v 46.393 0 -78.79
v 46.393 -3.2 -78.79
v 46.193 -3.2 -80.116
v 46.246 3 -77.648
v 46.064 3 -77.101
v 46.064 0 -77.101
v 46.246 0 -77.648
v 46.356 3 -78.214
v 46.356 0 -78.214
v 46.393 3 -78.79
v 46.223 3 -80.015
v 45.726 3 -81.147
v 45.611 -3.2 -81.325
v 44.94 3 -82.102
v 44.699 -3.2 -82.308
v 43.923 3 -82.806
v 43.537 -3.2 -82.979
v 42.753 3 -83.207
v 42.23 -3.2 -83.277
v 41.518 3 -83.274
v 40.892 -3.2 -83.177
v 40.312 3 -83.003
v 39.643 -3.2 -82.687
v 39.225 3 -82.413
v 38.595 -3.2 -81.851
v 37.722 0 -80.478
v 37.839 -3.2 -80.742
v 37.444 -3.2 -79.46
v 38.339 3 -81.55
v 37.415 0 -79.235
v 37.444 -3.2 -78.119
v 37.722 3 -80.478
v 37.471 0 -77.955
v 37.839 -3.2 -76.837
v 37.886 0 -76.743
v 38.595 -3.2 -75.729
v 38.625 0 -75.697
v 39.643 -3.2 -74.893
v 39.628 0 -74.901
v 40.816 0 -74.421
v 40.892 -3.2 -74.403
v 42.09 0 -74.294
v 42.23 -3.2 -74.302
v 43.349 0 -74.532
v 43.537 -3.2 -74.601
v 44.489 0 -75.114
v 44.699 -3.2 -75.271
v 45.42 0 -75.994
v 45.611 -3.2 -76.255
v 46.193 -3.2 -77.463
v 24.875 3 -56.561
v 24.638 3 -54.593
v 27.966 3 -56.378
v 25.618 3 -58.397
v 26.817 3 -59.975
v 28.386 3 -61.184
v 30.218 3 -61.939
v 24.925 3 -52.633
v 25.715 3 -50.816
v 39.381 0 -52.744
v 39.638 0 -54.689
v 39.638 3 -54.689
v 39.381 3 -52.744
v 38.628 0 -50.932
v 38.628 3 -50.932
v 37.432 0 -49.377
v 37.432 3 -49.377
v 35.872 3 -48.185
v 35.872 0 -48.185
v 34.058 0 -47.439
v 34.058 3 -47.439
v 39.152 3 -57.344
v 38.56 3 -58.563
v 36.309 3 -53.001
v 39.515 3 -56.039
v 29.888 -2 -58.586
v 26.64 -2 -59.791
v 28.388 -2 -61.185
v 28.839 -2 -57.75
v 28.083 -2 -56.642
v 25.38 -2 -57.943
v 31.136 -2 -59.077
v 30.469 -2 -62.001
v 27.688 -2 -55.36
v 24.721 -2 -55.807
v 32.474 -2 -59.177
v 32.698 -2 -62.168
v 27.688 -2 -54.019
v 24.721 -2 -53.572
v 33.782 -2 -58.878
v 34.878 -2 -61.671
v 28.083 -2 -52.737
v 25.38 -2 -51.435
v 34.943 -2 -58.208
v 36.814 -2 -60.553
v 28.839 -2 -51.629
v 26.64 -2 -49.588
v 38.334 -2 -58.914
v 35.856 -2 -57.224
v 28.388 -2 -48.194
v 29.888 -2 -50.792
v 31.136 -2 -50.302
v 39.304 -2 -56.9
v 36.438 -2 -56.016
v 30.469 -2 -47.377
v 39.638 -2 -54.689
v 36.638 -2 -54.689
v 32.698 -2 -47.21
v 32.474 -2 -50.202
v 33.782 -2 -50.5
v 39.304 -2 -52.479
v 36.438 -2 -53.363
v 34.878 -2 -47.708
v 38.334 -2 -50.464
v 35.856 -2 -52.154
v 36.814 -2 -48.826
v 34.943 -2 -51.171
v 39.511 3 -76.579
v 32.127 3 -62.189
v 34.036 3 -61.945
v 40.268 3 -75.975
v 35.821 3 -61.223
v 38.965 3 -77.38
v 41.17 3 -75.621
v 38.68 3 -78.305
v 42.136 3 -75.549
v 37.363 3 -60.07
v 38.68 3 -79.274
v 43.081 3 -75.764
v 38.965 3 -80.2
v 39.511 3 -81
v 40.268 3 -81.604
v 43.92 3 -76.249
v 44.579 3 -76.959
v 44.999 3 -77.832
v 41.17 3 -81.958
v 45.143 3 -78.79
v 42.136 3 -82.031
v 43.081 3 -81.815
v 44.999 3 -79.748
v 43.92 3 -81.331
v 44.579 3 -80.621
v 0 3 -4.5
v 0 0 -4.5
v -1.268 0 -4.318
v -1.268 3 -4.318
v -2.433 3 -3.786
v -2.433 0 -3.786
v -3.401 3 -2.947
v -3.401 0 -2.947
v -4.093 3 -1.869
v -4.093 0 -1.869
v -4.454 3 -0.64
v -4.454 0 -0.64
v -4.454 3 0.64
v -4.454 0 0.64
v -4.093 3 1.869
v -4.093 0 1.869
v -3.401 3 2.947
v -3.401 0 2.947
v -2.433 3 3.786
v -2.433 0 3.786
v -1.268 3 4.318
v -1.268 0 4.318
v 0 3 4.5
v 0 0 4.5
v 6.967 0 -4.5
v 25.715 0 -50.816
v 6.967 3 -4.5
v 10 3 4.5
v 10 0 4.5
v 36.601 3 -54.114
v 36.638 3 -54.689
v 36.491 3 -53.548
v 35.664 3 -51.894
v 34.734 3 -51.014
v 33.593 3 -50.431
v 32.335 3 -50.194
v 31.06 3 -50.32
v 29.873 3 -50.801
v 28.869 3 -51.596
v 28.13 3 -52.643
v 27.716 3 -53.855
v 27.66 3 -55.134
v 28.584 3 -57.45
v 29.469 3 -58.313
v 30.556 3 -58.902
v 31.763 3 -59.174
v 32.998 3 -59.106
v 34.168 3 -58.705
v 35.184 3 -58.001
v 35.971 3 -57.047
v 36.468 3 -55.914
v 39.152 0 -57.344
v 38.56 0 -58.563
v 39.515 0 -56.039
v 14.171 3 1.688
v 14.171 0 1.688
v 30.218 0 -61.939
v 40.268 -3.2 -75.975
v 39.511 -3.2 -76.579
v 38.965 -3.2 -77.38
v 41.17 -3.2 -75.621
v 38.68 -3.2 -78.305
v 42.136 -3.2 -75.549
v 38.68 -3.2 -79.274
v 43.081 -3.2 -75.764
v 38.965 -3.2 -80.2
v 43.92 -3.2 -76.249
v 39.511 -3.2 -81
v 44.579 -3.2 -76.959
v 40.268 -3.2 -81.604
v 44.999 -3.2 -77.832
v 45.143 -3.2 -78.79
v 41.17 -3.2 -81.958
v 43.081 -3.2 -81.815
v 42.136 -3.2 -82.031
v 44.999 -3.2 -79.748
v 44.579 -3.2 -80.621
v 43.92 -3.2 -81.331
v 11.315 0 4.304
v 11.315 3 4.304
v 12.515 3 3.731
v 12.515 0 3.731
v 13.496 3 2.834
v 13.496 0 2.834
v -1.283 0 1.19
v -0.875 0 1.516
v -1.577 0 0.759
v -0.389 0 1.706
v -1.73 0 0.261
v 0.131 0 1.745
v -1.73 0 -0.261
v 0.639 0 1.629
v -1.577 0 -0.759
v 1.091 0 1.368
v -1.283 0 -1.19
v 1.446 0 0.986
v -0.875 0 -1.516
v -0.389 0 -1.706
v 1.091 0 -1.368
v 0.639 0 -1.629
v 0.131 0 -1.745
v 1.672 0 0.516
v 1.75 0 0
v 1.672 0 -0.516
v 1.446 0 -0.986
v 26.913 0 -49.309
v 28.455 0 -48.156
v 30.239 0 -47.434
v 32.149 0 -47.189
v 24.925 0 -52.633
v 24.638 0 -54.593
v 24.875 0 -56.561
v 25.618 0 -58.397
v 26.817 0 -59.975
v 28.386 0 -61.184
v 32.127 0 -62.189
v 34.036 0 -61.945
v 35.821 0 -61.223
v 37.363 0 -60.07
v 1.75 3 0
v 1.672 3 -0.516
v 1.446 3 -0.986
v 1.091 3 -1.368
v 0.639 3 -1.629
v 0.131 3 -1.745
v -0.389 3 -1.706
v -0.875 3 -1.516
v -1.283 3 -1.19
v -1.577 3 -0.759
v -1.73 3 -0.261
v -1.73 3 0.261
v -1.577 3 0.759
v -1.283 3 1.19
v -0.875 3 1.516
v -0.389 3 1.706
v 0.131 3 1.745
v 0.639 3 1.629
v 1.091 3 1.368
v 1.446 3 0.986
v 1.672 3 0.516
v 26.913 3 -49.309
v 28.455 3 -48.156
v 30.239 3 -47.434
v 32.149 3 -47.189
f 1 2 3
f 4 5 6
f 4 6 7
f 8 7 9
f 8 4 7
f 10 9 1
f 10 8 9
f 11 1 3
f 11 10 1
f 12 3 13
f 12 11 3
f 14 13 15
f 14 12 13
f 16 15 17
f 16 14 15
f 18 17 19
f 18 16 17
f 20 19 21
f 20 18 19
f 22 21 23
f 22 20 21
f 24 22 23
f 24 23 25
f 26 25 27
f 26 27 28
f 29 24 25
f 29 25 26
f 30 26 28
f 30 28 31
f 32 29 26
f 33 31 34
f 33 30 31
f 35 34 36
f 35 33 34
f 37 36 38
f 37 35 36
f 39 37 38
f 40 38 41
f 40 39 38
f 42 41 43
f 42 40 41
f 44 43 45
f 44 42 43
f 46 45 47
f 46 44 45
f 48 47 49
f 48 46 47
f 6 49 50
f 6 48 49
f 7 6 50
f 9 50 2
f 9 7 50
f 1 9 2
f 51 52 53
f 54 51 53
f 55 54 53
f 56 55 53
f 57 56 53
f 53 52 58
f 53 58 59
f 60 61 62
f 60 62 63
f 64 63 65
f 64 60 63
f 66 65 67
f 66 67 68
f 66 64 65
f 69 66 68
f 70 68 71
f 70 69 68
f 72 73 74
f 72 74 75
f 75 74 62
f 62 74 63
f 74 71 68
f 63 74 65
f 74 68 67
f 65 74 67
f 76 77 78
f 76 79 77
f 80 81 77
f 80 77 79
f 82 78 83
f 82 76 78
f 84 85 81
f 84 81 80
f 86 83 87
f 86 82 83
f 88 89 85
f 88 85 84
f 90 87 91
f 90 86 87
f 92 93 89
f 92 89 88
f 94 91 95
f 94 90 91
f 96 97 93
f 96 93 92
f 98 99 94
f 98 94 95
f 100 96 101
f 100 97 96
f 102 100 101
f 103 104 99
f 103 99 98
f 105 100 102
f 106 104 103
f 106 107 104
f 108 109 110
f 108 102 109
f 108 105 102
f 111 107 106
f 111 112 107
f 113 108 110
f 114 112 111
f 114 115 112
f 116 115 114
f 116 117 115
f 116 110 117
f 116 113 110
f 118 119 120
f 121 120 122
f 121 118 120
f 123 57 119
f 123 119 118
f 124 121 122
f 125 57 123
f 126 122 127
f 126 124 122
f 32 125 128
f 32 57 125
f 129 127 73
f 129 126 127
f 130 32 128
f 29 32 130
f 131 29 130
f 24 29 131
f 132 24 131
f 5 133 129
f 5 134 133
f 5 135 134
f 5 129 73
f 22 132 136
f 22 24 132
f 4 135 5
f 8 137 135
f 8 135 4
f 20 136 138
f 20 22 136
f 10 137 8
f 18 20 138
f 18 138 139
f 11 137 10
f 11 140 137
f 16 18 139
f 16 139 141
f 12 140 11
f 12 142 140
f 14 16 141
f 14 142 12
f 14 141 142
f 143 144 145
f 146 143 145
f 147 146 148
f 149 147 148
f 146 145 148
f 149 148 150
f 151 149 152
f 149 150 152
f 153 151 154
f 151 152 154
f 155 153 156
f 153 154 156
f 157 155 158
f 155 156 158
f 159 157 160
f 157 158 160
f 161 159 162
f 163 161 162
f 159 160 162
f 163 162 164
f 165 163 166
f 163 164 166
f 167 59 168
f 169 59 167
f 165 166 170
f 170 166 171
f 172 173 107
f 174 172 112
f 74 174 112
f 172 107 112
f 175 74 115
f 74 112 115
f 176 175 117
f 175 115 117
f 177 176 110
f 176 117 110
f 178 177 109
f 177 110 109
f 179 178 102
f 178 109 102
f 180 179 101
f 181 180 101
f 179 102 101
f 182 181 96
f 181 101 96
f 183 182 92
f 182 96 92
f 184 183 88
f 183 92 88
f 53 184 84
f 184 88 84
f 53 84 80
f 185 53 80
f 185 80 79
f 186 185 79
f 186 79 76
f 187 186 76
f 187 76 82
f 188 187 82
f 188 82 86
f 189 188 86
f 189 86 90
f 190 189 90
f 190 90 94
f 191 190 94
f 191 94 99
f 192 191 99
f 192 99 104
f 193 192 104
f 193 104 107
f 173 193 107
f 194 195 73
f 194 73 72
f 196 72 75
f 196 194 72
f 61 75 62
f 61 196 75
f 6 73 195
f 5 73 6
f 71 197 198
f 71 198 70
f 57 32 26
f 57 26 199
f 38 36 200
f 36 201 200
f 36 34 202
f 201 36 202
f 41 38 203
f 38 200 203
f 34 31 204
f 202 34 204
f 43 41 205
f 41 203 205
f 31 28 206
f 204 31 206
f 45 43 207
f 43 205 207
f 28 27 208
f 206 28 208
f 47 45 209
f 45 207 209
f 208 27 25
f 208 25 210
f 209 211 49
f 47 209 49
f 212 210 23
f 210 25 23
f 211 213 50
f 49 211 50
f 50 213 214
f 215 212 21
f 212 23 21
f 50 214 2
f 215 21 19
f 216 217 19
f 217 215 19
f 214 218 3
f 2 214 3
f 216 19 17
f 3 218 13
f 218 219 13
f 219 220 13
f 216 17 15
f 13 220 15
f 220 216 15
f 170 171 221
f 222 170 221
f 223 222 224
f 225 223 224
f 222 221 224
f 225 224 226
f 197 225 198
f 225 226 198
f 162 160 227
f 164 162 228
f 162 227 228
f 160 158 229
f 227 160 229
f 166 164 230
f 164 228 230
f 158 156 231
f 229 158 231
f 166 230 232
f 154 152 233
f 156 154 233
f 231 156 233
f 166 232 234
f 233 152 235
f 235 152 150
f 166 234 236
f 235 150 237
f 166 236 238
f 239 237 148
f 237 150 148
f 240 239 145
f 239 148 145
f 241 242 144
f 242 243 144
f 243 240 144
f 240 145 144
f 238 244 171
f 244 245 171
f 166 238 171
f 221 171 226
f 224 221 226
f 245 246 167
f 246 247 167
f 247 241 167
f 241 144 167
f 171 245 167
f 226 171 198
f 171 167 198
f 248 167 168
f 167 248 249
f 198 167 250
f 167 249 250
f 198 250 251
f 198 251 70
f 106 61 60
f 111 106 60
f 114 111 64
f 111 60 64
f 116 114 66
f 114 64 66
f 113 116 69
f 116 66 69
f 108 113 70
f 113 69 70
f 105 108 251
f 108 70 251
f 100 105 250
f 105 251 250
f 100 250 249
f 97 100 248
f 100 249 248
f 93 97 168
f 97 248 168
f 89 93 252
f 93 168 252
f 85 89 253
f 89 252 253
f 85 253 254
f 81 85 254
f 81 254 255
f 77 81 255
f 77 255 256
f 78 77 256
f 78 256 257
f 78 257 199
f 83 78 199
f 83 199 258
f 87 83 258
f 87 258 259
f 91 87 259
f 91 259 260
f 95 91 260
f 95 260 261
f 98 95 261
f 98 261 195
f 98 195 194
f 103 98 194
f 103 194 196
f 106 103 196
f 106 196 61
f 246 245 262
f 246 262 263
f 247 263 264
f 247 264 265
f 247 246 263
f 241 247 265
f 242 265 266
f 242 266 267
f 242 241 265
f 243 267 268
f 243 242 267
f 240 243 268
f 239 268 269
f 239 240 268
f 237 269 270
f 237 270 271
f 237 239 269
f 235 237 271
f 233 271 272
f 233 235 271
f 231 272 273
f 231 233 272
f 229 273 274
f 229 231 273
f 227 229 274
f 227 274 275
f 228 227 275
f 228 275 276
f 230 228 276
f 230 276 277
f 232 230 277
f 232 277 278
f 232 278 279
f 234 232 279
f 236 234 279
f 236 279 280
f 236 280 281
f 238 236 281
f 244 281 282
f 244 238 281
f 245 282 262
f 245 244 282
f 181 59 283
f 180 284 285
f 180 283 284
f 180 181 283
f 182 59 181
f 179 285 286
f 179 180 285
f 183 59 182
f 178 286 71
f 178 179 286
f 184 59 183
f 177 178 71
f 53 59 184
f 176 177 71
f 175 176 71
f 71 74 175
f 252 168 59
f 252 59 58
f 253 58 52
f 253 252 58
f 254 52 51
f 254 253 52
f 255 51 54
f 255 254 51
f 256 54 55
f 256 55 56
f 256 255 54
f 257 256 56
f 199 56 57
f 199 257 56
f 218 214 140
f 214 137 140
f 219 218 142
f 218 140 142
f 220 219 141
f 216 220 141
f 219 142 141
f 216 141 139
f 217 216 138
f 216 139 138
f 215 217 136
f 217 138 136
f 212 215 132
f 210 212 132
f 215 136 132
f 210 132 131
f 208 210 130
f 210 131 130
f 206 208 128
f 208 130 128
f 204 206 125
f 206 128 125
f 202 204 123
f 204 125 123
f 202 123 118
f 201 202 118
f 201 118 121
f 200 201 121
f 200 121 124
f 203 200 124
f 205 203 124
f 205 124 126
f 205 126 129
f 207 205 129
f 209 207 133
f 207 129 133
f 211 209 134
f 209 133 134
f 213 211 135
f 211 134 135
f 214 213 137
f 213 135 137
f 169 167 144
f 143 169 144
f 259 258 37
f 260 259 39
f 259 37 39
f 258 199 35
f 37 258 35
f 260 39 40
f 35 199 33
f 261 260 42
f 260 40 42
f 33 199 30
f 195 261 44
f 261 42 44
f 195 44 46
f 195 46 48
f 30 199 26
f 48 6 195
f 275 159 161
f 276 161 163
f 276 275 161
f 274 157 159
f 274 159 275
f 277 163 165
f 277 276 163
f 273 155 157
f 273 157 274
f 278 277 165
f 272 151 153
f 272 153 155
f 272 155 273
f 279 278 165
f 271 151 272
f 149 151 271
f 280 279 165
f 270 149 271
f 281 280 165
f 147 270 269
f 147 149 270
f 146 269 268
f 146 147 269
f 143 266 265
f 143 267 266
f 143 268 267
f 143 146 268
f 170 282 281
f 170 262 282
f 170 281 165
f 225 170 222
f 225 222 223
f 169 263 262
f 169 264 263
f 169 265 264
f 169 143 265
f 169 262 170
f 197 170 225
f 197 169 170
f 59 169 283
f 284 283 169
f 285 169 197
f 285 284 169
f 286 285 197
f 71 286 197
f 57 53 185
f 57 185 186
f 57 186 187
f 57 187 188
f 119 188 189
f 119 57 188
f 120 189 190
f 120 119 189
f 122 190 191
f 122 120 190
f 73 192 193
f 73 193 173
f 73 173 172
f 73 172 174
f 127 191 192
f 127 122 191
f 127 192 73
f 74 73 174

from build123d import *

# Parameters (mm, degrees)
SKETCH1_R                = 1.75
BOSS_EXTRUDE1_DEPTH      = 3
BOSS_EXTRUDE2_DEPTH      = 3
SKETCH3_R                = 4.5
SKETCH3_R_2              = 3.25
BOSS_EXTRUDE3_DEPTH      = 6.2
SKETCH4_R                = 3.25
CUT_EXTRUDE1_DEPTH       = 3
SKETCH5_R                = 7.5
BOSS_EXTRUDE4_DEPTH      = 2
BOSS_EXTRUDE4_DEPTH_BACK = 3
SKETCH6_R                = 4.5
CUT_EXTRUDE2_DEPTH       = 6


with BuildPart() as part:
    # Sketch1 → Boss-Extrude1 (new body)
    with BuildSketch(Plane(origin=(0, 0, 0), x_dir=(1, 0, 0), z_dir=(0, 1, 0))):
        with BuildLine():
            Line((0, -4.5), (10, -4.5))
            ThreePointArc((10, -4.5), (14.5, 0), (10, 4.5))
            Line((10, 4.5), (0, 4.5))
            ThreePointArc((0, 4.5), (-4.5, 0), (0, -4.5))
        make_face()
        Circle(SKETCH1_R, mode=Mode.SUBTRACT)
    extrude(amount=BOSS_EXTRUDE1_DEPTH)

    # Sketch2 → Boss-Extrude2 (add)
    with BuildSketch(Plane(origin=(0, 3, 0), x_dir=(1, 0, 0), z_dir=(0, 1, 0))):
        with BuildLine():
            Line((10, 0), (11.688465713, 4.171220869))
            ThreePointArc((11.688465713, 4.171220869), (10.860088975, 4.41704052), (10, 4.5))
            Line((10, 4.5), (6.96685822, 4.5))
            ThreePointArc((6.96685822, 4.5), (8.346615874, -1.181489024), (14.171220869, -1.688465713))
            Line((14.171220869, -1.688465713), (10, 0))
        make_face()
        with BuildLine():
            ThreePointArc((46.064462111, 77.10126181), (43.648814249, 74.646303405), (40.204775529, 74.618506654))
            Line((40.204775529, 74.618506654), (11.688465713, 4.171220869))
            ThreePointArc((11.688465713, 4.171220869), (14.143424118, 1.755573007), (14.171220869, -1.688465713))
            Line((14.171220869, -1.688465713), (46.064462111, 77.10126181))
        make_face()
        with BuildLine():
            ThreePointArc((14.171220869, -1.688465713), (14.143424118, 1.755573007), (11.688465713, 4.171220869))
            Line((11.688465713, 4.171220869), (10, 0))
            Line((10, 0), (14.171220869, -1.688465713))
        make_face()
        with BuildLine():
            Line((11.688465713, 4.171220869), (40.204775529, 74.618506654))
            ThreePointArc((40.204775529, 74.618506654), (37.749817124, 77.034154516), (37.722020373, 80.478193235))
            Line((37.722020373, 80.478193235), (6.96685822, 4.5))
            Line((6.96685822, 4.5), (10, 4.5))
            ThreePointArc((10, 4.5), (10.860088975, 4.41704052), (11.688465713, 4.171220869))
        make_face()
        with BuildLine():
            Line((37.722020373, 80.478193235), (41.893241242, 78.789727523))
            Line((41.893241242, 78.789727523), (46.064462111, 77.10126181))
            ThreePointArc((46.064462111, 77.10126181), (46.310281762, 77.929638548), (46.393241242, 78.789727523))
            ThreePointArc((46.393241242, 78.789727523), (42.753330217, 83.206768043), (37.722020373, 80.478193235))
        make_face()
        with BuildLine():
            Line((46.064462111, 77.10126181), (41.893241242, 78.789727523))
            Line((41.893241242, 78.789727523), (40.204775529, 74.618506654))
            ThreePointArc((40.204775529, 74.618506654), (43.648814249, 74.646303405), (46.064462111, 77.10126181))
        make_face()
        with BuildLine():
            Line((40.204775529, 74.618506654), (41.893241242, 78.789727523))
            Line((41.893241242, 78.789727523), (37.722020373, 80.478193235))
            ThreePointArc((37.722020373, 80.478193235), (37.749817124, 77.034154516), (40.204775529, 74.618506654))
        make_face()
    extrude(amount=-BOSS_EXTRUDE2_DEPTH)

    # Sketch3 → Boss-Extrude3 (add)
    with BuildSketch(Plane(origin=(0, 3, 0), x_dir=(1, 0, 0), z_dir=(0, 1, 0))):
        with Locations((41.893241242, 78.789727523)):
            Circle(SKETCH3_R)
        with Locations((41.893241242, 78.789727523)):
            Circle(SKETCH3_R_2, mode=Mode.SUBTRACT)
    extrude(amount=-BOSS_EXTRUDE3_DEPTH)

    # Sketch4 → Cut-Extrude1 (cut)
    with BuildSketch(Plane(origin=(0, 3, 0), x_dir=(1, 0, 0), z_dir=(0, 1, 0))):
        with Locations((41.893241242, 78.789727523)):
            Circle(SKETCH4_R)
    extrude(amount=-CUT_EXTRUDE1_DEPTH, mode=Mode.SUBTRACT)

    # Sketch5 → Boss-Extrude4 (add, two sides)
    with BuildSketch(Plane.XZ) as boss_extrude4_sk:
        with Locations((32.137661568, -54.68934028)):
            Circle(SKETCH5_R)
    extrude(amount=BOSS_EXTRUDE4_DEPTH)
    extrude(boss_extrude4_sk.sketch, amount=-BOSS_EXTRUDE4_DEPTH_BACK)

    # Sketch6 → Cut-Extrude2 (cut, through all)
    with BuildSketch(Plane.XZ.offset(2)):
        with Locations((32.137661568, -54.68934028)):
            Circle(SKETCH6_R)
    extrude(amount=-CUT_EXTRUDE2_DEPTH, mode=Mode.SUBTRACT)


solid = part.part
